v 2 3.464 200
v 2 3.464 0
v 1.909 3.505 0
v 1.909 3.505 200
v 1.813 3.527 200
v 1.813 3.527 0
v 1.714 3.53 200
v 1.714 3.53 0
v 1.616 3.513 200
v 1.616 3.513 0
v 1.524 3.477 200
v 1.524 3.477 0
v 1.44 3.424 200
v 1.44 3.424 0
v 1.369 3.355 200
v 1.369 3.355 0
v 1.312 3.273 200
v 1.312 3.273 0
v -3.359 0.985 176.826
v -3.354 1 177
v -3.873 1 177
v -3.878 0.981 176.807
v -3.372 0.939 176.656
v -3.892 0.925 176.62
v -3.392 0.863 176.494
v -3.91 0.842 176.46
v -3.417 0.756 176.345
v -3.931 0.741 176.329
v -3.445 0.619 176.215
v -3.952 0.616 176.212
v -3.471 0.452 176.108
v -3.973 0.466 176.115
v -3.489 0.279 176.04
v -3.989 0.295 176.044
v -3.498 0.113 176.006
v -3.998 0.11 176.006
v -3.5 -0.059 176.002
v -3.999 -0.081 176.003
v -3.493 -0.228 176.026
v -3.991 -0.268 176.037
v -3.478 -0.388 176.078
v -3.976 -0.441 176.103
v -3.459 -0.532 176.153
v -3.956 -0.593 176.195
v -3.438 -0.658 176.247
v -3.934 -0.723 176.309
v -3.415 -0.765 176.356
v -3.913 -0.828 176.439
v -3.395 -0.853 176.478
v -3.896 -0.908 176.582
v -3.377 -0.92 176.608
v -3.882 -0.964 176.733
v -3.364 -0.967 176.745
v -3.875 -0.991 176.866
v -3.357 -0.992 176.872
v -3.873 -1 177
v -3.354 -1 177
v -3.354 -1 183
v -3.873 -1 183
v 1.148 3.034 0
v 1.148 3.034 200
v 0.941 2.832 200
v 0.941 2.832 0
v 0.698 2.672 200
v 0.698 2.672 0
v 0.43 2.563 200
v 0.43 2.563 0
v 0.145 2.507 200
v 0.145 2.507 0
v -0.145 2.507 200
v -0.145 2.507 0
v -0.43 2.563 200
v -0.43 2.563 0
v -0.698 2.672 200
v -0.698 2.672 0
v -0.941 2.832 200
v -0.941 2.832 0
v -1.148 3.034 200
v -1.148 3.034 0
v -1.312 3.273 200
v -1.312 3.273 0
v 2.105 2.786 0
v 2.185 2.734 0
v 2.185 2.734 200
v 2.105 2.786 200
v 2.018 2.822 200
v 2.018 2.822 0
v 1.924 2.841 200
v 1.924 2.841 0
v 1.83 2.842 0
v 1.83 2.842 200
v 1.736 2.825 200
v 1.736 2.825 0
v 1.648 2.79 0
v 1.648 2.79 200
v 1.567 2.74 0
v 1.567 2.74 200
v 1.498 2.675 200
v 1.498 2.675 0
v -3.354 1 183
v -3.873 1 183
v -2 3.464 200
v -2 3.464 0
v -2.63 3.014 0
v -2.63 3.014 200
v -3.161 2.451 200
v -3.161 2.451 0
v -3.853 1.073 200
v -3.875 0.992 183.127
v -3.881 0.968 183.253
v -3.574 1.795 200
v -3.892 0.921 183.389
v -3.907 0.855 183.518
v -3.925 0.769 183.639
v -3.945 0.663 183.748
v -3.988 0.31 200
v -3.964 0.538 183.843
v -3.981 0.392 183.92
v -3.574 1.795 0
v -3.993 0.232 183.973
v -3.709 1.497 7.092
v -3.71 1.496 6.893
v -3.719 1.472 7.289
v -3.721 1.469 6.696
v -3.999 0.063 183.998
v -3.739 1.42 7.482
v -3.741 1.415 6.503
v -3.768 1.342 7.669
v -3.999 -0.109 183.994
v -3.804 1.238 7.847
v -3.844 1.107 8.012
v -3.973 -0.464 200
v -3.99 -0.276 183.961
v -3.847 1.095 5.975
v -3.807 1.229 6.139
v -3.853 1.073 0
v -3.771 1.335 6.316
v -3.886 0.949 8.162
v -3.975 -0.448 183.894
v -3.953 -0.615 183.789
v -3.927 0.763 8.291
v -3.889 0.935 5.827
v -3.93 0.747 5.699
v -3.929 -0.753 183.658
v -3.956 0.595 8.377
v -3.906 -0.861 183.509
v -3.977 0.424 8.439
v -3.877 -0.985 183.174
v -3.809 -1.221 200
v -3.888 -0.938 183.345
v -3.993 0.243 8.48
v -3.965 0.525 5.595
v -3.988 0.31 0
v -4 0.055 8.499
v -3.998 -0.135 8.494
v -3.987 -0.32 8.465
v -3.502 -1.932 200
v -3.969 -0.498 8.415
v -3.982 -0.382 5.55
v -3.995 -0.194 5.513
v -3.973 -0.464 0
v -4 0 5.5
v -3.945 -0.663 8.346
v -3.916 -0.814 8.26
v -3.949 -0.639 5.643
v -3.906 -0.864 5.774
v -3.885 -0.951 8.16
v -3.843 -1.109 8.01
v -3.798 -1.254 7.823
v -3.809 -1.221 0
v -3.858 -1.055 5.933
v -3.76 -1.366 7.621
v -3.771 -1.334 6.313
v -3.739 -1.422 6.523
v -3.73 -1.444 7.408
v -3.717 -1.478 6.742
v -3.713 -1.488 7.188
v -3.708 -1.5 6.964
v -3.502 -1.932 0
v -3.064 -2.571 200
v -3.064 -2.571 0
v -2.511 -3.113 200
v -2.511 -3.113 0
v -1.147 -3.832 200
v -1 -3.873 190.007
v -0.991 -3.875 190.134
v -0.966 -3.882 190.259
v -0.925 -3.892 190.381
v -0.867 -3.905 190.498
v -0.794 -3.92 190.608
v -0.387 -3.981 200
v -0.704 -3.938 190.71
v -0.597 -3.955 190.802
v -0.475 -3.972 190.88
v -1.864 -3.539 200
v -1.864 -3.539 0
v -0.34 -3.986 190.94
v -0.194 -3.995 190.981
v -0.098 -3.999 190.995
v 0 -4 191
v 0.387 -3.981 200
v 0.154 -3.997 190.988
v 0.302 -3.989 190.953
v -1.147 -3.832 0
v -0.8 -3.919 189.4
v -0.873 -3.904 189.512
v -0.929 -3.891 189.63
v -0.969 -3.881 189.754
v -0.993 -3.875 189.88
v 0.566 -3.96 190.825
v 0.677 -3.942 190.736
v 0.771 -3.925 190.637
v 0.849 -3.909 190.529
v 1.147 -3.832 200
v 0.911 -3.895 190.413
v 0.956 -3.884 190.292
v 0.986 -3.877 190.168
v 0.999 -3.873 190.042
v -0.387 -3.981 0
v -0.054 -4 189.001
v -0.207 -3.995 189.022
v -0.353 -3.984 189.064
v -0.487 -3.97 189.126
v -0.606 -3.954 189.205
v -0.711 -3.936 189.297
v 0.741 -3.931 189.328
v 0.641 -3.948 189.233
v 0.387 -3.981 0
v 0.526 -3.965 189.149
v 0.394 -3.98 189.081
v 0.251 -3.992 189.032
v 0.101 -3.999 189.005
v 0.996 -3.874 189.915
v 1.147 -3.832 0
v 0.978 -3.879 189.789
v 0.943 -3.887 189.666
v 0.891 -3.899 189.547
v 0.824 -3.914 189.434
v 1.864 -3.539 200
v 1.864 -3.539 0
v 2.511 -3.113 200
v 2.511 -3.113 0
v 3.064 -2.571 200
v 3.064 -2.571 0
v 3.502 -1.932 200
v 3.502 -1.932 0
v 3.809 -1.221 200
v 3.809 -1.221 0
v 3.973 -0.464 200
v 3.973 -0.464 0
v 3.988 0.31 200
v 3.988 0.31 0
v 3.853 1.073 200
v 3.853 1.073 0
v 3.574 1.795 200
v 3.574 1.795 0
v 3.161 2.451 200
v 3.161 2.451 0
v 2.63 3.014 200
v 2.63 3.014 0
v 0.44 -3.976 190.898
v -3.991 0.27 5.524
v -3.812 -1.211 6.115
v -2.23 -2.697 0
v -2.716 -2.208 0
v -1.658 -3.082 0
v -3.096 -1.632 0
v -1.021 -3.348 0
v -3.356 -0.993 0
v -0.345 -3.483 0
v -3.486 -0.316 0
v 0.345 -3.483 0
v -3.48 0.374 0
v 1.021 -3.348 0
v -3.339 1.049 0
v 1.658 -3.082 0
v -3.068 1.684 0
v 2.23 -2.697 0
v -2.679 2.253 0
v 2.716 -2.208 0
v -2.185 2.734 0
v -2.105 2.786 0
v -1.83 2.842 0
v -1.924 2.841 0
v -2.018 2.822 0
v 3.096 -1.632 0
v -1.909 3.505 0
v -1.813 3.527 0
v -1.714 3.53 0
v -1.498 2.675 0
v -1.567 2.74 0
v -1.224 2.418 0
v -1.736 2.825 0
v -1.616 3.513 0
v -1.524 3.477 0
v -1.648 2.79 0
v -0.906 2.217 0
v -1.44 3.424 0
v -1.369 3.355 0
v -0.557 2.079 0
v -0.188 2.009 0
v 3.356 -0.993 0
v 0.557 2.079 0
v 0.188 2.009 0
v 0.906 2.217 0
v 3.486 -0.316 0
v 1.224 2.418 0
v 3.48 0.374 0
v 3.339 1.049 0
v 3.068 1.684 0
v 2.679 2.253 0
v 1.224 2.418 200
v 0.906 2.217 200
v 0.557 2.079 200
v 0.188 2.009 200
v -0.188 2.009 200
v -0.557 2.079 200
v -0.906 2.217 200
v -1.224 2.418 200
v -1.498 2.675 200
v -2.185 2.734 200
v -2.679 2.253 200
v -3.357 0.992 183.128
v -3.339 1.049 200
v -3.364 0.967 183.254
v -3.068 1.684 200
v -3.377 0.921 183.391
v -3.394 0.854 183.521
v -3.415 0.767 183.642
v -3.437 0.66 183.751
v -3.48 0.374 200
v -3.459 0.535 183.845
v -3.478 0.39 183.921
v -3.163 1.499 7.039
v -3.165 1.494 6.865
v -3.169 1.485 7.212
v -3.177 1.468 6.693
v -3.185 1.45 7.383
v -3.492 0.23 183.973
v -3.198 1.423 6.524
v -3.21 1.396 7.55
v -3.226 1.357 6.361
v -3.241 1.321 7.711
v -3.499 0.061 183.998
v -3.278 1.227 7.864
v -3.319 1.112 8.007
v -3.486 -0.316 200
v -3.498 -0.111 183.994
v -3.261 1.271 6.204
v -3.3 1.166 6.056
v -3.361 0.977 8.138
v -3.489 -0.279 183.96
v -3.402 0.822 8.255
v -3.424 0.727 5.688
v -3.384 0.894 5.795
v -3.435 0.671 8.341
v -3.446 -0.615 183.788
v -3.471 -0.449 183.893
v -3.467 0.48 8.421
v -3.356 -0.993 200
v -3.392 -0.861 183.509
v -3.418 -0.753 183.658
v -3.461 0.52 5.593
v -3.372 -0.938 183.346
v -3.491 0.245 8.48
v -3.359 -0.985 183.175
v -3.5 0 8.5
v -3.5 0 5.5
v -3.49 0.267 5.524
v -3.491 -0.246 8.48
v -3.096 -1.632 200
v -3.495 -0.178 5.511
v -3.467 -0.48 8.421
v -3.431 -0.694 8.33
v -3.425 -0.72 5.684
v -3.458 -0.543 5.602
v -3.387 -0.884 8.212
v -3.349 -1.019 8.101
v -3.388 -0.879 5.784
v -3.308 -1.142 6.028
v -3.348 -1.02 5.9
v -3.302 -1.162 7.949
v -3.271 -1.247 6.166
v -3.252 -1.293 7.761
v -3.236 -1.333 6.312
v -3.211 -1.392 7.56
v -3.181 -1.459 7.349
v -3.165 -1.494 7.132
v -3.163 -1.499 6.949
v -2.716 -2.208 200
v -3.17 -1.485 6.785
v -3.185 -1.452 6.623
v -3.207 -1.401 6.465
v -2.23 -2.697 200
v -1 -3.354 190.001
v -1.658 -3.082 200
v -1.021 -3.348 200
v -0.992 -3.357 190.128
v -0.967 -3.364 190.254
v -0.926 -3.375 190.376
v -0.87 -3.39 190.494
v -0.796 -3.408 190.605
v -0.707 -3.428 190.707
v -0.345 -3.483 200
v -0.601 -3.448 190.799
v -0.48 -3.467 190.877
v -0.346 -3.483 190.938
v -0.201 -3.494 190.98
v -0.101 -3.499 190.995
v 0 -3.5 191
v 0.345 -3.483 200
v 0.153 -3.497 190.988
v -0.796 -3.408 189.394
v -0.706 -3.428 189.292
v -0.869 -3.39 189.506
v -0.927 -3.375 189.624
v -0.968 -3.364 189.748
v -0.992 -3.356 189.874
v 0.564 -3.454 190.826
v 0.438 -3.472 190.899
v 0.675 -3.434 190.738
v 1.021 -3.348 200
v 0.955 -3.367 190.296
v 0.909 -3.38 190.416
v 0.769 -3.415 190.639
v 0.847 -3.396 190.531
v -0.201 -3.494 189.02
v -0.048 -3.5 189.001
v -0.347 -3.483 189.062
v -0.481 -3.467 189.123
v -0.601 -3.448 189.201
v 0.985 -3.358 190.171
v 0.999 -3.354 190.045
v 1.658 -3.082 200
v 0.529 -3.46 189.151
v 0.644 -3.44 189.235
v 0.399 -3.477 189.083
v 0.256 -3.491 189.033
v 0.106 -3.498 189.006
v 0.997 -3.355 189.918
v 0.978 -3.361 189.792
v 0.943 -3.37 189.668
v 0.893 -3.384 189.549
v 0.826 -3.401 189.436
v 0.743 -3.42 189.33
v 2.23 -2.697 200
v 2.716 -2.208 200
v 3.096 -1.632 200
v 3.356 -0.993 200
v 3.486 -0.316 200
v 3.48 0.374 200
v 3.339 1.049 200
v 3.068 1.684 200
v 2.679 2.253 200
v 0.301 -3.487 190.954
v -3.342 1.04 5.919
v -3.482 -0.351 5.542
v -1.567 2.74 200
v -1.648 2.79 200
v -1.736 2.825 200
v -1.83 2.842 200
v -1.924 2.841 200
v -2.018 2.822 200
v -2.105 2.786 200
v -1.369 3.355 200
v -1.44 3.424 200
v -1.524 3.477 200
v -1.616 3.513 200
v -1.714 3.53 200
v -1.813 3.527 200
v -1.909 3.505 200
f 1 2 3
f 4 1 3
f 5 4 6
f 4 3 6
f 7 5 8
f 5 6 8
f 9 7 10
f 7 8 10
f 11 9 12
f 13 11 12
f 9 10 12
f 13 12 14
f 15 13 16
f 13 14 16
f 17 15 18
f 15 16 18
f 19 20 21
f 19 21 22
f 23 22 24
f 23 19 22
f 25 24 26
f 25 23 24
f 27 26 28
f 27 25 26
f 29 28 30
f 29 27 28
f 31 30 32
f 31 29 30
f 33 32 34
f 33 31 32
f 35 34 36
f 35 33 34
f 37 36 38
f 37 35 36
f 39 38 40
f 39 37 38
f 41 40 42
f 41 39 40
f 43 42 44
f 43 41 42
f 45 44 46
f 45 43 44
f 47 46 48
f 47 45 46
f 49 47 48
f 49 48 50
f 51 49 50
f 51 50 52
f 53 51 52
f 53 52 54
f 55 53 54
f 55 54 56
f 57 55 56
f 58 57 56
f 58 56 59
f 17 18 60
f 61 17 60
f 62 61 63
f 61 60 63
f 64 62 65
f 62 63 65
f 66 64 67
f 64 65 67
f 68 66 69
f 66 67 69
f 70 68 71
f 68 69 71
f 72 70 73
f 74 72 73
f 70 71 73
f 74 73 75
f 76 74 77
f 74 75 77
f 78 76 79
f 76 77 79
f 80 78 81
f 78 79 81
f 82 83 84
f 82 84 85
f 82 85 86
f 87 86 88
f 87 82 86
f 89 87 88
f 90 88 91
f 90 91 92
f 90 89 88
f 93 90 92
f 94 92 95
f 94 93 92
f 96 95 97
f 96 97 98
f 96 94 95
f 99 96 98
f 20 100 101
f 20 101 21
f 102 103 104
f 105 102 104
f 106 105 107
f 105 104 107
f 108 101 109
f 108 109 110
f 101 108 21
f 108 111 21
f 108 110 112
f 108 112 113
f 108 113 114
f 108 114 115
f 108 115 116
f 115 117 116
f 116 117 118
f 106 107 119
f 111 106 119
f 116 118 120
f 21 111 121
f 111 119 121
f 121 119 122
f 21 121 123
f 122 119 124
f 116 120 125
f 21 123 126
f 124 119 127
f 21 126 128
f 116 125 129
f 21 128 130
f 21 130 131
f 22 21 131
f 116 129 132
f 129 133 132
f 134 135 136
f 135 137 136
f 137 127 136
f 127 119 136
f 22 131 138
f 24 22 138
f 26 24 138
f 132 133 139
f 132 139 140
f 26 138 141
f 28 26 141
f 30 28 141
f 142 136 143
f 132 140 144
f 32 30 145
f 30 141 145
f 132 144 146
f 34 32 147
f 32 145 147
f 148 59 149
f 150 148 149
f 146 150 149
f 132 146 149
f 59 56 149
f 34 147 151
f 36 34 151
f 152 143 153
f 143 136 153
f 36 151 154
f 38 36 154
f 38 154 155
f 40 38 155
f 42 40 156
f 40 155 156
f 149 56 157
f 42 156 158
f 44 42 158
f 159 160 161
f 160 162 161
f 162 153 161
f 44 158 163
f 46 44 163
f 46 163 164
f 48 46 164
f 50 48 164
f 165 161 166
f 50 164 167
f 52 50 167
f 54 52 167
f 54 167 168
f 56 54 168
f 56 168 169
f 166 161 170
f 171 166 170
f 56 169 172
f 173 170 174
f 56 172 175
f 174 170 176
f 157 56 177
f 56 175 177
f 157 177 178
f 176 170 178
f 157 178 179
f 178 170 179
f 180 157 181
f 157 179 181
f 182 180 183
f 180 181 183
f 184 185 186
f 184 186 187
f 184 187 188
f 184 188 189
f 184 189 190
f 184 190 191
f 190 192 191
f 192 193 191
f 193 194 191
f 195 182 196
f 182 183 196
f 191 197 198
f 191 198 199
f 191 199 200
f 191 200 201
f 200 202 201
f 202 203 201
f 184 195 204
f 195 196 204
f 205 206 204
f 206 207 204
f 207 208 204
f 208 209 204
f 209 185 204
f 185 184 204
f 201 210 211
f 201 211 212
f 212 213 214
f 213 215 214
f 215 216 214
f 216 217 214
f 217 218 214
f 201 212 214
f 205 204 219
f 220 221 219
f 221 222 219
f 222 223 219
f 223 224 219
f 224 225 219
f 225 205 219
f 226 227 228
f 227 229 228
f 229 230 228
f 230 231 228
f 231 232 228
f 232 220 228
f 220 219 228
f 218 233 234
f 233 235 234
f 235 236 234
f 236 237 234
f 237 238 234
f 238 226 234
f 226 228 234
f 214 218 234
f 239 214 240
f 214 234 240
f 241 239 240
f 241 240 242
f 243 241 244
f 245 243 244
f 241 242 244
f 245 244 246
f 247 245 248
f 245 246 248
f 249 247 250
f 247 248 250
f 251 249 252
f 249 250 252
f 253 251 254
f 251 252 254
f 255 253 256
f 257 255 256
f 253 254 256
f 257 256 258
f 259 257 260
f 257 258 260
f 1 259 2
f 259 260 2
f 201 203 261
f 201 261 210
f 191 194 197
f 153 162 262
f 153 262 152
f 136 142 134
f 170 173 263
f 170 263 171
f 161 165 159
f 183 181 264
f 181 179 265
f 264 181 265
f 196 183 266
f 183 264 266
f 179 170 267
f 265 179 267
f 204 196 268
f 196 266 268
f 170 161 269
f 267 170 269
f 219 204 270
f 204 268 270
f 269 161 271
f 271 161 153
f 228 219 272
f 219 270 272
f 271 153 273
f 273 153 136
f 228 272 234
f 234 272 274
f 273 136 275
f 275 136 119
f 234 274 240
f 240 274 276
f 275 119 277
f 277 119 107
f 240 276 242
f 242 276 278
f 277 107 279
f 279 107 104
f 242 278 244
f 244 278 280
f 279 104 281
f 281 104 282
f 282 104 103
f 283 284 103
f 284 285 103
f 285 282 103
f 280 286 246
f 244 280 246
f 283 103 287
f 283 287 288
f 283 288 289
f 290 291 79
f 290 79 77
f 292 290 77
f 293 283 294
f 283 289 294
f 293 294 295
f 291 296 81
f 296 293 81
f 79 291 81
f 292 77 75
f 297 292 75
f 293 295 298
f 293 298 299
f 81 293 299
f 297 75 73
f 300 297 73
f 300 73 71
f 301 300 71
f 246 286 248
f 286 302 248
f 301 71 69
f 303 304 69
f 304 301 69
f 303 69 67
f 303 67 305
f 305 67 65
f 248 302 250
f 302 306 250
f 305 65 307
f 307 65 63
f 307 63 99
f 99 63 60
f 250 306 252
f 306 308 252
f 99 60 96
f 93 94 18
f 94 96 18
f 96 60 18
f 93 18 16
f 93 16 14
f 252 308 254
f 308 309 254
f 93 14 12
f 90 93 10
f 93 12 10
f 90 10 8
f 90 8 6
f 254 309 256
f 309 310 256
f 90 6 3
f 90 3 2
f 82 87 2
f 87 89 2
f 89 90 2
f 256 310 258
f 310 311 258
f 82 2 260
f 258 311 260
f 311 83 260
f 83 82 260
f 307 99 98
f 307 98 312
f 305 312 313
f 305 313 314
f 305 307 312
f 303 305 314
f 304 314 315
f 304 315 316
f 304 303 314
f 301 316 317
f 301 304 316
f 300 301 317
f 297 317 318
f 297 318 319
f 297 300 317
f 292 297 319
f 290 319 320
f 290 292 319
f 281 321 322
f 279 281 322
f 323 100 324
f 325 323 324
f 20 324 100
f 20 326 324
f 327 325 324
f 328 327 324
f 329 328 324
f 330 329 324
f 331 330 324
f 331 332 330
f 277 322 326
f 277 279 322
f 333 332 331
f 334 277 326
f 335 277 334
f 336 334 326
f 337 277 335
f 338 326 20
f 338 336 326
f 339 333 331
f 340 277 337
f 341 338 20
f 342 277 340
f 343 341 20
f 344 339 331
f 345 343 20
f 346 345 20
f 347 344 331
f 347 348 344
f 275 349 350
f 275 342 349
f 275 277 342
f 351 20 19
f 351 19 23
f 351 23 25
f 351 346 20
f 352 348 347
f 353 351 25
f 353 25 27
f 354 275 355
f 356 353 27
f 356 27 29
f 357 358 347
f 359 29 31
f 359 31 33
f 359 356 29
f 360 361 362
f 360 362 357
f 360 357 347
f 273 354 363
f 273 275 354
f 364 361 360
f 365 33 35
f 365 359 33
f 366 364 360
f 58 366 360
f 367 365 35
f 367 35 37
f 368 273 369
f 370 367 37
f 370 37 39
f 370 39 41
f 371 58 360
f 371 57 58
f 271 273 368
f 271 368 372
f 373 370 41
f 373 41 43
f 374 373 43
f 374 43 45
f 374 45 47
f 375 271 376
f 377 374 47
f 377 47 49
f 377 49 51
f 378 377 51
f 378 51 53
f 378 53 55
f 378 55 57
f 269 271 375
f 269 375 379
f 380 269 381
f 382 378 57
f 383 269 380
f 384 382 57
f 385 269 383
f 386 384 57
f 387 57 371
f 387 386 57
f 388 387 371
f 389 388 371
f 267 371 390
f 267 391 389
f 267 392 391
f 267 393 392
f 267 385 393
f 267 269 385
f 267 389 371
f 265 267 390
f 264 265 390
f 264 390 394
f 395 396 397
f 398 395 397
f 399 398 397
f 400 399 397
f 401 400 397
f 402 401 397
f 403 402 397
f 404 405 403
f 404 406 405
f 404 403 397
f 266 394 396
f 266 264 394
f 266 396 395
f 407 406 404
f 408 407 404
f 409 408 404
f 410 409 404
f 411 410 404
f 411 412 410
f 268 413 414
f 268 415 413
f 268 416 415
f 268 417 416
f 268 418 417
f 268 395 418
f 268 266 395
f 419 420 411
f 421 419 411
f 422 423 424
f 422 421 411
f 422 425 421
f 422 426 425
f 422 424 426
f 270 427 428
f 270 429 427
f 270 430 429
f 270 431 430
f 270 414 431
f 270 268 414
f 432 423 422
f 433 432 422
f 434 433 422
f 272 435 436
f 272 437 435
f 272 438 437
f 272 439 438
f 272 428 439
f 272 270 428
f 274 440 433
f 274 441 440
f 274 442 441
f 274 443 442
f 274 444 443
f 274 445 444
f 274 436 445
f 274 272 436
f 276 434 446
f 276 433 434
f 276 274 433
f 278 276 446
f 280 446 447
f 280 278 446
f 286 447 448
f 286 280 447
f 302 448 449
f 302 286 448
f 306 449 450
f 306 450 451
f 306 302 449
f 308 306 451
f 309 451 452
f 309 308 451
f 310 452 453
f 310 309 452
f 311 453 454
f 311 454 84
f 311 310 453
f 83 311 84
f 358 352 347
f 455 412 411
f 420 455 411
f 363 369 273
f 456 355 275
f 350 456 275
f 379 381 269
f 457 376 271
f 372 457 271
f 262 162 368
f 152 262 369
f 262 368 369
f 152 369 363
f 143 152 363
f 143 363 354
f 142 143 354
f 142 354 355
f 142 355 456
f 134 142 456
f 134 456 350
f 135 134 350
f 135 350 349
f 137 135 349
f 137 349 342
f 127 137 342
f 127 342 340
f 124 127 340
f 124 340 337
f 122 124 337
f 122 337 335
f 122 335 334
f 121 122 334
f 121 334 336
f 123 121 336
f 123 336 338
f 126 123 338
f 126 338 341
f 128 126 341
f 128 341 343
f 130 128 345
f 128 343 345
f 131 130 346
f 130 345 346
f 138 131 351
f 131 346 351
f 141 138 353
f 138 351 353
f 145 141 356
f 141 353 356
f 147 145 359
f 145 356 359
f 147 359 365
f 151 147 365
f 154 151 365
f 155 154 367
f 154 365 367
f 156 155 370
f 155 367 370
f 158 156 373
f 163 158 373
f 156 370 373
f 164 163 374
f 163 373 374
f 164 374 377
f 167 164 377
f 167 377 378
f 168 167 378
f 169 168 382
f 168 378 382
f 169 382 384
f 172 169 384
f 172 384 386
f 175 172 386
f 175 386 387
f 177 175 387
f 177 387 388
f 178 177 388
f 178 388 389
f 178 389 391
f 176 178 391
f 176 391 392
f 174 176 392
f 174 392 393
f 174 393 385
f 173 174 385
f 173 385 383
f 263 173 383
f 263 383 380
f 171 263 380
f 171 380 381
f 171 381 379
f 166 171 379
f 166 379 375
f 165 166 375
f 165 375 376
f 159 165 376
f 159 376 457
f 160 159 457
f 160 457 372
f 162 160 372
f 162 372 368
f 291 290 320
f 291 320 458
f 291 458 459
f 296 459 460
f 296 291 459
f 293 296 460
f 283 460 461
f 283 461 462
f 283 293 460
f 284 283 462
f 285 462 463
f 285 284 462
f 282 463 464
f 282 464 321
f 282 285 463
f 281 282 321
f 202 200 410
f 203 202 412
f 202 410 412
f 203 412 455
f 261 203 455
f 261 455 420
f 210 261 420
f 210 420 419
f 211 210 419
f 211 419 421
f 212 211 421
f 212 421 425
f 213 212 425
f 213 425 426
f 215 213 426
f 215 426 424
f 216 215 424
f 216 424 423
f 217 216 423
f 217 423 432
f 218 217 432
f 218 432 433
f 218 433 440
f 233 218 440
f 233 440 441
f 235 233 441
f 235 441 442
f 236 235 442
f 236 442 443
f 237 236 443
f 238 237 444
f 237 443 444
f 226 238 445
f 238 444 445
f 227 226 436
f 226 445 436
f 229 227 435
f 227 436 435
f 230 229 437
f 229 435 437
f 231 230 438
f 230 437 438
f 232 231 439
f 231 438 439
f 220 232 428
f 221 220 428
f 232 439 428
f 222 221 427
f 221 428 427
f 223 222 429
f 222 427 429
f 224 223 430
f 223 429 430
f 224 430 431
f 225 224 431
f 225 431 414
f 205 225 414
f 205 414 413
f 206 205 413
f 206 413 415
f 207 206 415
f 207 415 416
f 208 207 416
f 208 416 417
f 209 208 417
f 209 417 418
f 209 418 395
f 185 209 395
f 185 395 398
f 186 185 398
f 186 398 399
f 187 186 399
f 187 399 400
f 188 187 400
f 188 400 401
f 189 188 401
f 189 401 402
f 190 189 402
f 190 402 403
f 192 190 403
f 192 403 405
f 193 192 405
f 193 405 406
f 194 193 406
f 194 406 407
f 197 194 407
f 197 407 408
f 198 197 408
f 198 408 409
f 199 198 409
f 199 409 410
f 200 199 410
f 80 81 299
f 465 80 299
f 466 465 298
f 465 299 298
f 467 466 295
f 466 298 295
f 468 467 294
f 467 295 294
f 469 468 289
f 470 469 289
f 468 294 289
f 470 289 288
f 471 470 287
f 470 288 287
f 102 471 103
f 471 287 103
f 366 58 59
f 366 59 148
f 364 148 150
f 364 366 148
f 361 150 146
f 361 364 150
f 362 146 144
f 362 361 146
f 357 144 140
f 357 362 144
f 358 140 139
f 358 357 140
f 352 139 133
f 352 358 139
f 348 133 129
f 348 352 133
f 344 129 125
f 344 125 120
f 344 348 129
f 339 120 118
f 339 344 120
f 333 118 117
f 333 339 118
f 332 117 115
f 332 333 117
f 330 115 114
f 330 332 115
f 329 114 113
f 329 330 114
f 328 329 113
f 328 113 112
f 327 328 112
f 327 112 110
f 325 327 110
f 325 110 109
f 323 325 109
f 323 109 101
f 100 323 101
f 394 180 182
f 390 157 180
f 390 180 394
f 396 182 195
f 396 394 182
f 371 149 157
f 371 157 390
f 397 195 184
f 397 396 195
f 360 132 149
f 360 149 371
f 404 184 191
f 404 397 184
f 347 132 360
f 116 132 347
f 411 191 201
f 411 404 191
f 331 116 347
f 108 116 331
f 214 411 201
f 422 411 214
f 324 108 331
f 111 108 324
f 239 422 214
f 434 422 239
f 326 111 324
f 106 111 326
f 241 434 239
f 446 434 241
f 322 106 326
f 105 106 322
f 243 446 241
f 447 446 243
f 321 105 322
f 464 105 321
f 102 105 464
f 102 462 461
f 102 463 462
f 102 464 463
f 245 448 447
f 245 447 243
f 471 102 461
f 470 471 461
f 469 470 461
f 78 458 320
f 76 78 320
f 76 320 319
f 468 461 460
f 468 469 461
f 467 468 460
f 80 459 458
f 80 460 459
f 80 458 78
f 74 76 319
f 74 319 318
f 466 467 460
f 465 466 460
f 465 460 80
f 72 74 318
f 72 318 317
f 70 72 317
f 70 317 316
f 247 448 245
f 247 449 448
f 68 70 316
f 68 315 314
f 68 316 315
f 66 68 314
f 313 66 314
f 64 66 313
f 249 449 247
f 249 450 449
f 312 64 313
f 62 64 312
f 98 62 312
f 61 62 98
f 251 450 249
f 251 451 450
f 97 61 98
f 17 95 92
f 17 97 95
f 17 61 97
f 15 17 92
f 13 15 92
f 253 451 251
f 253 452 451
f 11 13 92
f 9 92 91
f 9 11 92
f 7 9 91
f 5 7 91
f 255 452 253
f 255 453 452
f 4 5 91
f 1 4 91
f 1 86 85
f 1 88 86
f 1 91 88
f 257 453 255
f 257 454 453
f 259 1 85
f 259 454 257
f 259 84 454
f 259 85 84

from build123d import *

# Parameters (mm, degrees)
ESTRUSIONE_ESTRUSIONE1_DEPTH = 200
SCHIZZO2_R                   = 1.5
TAGLIO_ESTRUSIONE1_DEPTH     = 200
SCHIZZO3_R                   = 1
TAGLIO_ESTRUSIONE2_DEPTH     = 200


with BuildPart() as part:
    # Schizzo1 → Estrusione-Estrusione1 (new body)
    with BuildSketch(Plane.XY):
        with BuildLine():
            ThreePointArc((-1.999681097, 3.464285714), (0, -4), (1.999681097, 3.464285714))
            ThreePointArc((1.999681097, 3.464285714), (1.615959904, 3.513025861), (1.31229072, 3.2734375))
            ThreePointArc((1.31229072, 3.2734375), (0, 2.5), (-1.31229072, 3.2734375))
            ThreePointArc((-1.31229072, 3.2734375), (-1.615959904, 3.513025861), (-1.999681097, 3.464285714))
        make_face()
        with BuildLine():
            ThreePointArc((-2.184763914, 2.734375), (0, -3.5), (2.184763914, 2.734375))
            ThreePointArc((2.184763914, 2.734375), (1.829579631, 2.841891076), (1.498123827, 2.675))
            ThreePointArc((1.498123827, 2.675), (0, 2), (-1.498123827, 2.675))
            ThreePointArc((-1.498123827, 2.675), (-1.829579631, 2.841891076), (-2.184763914, 2.734375))
        make_face(mode=Mode.SUBTRACT)
    extrude(amount=ESTRUSIONE_ESTRUSIONE1_DEPTH)

    # Schizzo2 → Taglio-Estrusione1 (cut)
    with BuildSketch(Plane(origin=(0, 0, 0), x_dir=(0, 0, -1), z_dir=(1, 0, 0))):
        with Locations((-7, 0)):
            Circle(SCHIZZO2_R)
        with BuildLine():
            Line((-183, 1), (-177, 1))
            ThreePointArc((-177, 1), (-176, 0), (-177, -1))
            Line((-177, -1), (-183, -1))
            ThreePointArc((-183, -1), (-184, 0), (-183, 1))
        make_face()
    extrude(amount=-TAGLIO_ESTRUSIONE1_DEPTH, mode=Mode.SUBTRACT)

    # Schizzo3 → Taglio-Estrusione2 (cut)
    with BuildSketch(Plane(origin=(0, 0, 0), x_dir=(1, 0, 0), z_dir=(0, 1, 0))):
        with Locations((0, -190)):
            Circle(SCHIZZO3_R)
    extrude(amount=-TAGLIO_ESTRUSIONE2_DEPTH, mode=Mode.SUBTRACT)


solid = part.part
